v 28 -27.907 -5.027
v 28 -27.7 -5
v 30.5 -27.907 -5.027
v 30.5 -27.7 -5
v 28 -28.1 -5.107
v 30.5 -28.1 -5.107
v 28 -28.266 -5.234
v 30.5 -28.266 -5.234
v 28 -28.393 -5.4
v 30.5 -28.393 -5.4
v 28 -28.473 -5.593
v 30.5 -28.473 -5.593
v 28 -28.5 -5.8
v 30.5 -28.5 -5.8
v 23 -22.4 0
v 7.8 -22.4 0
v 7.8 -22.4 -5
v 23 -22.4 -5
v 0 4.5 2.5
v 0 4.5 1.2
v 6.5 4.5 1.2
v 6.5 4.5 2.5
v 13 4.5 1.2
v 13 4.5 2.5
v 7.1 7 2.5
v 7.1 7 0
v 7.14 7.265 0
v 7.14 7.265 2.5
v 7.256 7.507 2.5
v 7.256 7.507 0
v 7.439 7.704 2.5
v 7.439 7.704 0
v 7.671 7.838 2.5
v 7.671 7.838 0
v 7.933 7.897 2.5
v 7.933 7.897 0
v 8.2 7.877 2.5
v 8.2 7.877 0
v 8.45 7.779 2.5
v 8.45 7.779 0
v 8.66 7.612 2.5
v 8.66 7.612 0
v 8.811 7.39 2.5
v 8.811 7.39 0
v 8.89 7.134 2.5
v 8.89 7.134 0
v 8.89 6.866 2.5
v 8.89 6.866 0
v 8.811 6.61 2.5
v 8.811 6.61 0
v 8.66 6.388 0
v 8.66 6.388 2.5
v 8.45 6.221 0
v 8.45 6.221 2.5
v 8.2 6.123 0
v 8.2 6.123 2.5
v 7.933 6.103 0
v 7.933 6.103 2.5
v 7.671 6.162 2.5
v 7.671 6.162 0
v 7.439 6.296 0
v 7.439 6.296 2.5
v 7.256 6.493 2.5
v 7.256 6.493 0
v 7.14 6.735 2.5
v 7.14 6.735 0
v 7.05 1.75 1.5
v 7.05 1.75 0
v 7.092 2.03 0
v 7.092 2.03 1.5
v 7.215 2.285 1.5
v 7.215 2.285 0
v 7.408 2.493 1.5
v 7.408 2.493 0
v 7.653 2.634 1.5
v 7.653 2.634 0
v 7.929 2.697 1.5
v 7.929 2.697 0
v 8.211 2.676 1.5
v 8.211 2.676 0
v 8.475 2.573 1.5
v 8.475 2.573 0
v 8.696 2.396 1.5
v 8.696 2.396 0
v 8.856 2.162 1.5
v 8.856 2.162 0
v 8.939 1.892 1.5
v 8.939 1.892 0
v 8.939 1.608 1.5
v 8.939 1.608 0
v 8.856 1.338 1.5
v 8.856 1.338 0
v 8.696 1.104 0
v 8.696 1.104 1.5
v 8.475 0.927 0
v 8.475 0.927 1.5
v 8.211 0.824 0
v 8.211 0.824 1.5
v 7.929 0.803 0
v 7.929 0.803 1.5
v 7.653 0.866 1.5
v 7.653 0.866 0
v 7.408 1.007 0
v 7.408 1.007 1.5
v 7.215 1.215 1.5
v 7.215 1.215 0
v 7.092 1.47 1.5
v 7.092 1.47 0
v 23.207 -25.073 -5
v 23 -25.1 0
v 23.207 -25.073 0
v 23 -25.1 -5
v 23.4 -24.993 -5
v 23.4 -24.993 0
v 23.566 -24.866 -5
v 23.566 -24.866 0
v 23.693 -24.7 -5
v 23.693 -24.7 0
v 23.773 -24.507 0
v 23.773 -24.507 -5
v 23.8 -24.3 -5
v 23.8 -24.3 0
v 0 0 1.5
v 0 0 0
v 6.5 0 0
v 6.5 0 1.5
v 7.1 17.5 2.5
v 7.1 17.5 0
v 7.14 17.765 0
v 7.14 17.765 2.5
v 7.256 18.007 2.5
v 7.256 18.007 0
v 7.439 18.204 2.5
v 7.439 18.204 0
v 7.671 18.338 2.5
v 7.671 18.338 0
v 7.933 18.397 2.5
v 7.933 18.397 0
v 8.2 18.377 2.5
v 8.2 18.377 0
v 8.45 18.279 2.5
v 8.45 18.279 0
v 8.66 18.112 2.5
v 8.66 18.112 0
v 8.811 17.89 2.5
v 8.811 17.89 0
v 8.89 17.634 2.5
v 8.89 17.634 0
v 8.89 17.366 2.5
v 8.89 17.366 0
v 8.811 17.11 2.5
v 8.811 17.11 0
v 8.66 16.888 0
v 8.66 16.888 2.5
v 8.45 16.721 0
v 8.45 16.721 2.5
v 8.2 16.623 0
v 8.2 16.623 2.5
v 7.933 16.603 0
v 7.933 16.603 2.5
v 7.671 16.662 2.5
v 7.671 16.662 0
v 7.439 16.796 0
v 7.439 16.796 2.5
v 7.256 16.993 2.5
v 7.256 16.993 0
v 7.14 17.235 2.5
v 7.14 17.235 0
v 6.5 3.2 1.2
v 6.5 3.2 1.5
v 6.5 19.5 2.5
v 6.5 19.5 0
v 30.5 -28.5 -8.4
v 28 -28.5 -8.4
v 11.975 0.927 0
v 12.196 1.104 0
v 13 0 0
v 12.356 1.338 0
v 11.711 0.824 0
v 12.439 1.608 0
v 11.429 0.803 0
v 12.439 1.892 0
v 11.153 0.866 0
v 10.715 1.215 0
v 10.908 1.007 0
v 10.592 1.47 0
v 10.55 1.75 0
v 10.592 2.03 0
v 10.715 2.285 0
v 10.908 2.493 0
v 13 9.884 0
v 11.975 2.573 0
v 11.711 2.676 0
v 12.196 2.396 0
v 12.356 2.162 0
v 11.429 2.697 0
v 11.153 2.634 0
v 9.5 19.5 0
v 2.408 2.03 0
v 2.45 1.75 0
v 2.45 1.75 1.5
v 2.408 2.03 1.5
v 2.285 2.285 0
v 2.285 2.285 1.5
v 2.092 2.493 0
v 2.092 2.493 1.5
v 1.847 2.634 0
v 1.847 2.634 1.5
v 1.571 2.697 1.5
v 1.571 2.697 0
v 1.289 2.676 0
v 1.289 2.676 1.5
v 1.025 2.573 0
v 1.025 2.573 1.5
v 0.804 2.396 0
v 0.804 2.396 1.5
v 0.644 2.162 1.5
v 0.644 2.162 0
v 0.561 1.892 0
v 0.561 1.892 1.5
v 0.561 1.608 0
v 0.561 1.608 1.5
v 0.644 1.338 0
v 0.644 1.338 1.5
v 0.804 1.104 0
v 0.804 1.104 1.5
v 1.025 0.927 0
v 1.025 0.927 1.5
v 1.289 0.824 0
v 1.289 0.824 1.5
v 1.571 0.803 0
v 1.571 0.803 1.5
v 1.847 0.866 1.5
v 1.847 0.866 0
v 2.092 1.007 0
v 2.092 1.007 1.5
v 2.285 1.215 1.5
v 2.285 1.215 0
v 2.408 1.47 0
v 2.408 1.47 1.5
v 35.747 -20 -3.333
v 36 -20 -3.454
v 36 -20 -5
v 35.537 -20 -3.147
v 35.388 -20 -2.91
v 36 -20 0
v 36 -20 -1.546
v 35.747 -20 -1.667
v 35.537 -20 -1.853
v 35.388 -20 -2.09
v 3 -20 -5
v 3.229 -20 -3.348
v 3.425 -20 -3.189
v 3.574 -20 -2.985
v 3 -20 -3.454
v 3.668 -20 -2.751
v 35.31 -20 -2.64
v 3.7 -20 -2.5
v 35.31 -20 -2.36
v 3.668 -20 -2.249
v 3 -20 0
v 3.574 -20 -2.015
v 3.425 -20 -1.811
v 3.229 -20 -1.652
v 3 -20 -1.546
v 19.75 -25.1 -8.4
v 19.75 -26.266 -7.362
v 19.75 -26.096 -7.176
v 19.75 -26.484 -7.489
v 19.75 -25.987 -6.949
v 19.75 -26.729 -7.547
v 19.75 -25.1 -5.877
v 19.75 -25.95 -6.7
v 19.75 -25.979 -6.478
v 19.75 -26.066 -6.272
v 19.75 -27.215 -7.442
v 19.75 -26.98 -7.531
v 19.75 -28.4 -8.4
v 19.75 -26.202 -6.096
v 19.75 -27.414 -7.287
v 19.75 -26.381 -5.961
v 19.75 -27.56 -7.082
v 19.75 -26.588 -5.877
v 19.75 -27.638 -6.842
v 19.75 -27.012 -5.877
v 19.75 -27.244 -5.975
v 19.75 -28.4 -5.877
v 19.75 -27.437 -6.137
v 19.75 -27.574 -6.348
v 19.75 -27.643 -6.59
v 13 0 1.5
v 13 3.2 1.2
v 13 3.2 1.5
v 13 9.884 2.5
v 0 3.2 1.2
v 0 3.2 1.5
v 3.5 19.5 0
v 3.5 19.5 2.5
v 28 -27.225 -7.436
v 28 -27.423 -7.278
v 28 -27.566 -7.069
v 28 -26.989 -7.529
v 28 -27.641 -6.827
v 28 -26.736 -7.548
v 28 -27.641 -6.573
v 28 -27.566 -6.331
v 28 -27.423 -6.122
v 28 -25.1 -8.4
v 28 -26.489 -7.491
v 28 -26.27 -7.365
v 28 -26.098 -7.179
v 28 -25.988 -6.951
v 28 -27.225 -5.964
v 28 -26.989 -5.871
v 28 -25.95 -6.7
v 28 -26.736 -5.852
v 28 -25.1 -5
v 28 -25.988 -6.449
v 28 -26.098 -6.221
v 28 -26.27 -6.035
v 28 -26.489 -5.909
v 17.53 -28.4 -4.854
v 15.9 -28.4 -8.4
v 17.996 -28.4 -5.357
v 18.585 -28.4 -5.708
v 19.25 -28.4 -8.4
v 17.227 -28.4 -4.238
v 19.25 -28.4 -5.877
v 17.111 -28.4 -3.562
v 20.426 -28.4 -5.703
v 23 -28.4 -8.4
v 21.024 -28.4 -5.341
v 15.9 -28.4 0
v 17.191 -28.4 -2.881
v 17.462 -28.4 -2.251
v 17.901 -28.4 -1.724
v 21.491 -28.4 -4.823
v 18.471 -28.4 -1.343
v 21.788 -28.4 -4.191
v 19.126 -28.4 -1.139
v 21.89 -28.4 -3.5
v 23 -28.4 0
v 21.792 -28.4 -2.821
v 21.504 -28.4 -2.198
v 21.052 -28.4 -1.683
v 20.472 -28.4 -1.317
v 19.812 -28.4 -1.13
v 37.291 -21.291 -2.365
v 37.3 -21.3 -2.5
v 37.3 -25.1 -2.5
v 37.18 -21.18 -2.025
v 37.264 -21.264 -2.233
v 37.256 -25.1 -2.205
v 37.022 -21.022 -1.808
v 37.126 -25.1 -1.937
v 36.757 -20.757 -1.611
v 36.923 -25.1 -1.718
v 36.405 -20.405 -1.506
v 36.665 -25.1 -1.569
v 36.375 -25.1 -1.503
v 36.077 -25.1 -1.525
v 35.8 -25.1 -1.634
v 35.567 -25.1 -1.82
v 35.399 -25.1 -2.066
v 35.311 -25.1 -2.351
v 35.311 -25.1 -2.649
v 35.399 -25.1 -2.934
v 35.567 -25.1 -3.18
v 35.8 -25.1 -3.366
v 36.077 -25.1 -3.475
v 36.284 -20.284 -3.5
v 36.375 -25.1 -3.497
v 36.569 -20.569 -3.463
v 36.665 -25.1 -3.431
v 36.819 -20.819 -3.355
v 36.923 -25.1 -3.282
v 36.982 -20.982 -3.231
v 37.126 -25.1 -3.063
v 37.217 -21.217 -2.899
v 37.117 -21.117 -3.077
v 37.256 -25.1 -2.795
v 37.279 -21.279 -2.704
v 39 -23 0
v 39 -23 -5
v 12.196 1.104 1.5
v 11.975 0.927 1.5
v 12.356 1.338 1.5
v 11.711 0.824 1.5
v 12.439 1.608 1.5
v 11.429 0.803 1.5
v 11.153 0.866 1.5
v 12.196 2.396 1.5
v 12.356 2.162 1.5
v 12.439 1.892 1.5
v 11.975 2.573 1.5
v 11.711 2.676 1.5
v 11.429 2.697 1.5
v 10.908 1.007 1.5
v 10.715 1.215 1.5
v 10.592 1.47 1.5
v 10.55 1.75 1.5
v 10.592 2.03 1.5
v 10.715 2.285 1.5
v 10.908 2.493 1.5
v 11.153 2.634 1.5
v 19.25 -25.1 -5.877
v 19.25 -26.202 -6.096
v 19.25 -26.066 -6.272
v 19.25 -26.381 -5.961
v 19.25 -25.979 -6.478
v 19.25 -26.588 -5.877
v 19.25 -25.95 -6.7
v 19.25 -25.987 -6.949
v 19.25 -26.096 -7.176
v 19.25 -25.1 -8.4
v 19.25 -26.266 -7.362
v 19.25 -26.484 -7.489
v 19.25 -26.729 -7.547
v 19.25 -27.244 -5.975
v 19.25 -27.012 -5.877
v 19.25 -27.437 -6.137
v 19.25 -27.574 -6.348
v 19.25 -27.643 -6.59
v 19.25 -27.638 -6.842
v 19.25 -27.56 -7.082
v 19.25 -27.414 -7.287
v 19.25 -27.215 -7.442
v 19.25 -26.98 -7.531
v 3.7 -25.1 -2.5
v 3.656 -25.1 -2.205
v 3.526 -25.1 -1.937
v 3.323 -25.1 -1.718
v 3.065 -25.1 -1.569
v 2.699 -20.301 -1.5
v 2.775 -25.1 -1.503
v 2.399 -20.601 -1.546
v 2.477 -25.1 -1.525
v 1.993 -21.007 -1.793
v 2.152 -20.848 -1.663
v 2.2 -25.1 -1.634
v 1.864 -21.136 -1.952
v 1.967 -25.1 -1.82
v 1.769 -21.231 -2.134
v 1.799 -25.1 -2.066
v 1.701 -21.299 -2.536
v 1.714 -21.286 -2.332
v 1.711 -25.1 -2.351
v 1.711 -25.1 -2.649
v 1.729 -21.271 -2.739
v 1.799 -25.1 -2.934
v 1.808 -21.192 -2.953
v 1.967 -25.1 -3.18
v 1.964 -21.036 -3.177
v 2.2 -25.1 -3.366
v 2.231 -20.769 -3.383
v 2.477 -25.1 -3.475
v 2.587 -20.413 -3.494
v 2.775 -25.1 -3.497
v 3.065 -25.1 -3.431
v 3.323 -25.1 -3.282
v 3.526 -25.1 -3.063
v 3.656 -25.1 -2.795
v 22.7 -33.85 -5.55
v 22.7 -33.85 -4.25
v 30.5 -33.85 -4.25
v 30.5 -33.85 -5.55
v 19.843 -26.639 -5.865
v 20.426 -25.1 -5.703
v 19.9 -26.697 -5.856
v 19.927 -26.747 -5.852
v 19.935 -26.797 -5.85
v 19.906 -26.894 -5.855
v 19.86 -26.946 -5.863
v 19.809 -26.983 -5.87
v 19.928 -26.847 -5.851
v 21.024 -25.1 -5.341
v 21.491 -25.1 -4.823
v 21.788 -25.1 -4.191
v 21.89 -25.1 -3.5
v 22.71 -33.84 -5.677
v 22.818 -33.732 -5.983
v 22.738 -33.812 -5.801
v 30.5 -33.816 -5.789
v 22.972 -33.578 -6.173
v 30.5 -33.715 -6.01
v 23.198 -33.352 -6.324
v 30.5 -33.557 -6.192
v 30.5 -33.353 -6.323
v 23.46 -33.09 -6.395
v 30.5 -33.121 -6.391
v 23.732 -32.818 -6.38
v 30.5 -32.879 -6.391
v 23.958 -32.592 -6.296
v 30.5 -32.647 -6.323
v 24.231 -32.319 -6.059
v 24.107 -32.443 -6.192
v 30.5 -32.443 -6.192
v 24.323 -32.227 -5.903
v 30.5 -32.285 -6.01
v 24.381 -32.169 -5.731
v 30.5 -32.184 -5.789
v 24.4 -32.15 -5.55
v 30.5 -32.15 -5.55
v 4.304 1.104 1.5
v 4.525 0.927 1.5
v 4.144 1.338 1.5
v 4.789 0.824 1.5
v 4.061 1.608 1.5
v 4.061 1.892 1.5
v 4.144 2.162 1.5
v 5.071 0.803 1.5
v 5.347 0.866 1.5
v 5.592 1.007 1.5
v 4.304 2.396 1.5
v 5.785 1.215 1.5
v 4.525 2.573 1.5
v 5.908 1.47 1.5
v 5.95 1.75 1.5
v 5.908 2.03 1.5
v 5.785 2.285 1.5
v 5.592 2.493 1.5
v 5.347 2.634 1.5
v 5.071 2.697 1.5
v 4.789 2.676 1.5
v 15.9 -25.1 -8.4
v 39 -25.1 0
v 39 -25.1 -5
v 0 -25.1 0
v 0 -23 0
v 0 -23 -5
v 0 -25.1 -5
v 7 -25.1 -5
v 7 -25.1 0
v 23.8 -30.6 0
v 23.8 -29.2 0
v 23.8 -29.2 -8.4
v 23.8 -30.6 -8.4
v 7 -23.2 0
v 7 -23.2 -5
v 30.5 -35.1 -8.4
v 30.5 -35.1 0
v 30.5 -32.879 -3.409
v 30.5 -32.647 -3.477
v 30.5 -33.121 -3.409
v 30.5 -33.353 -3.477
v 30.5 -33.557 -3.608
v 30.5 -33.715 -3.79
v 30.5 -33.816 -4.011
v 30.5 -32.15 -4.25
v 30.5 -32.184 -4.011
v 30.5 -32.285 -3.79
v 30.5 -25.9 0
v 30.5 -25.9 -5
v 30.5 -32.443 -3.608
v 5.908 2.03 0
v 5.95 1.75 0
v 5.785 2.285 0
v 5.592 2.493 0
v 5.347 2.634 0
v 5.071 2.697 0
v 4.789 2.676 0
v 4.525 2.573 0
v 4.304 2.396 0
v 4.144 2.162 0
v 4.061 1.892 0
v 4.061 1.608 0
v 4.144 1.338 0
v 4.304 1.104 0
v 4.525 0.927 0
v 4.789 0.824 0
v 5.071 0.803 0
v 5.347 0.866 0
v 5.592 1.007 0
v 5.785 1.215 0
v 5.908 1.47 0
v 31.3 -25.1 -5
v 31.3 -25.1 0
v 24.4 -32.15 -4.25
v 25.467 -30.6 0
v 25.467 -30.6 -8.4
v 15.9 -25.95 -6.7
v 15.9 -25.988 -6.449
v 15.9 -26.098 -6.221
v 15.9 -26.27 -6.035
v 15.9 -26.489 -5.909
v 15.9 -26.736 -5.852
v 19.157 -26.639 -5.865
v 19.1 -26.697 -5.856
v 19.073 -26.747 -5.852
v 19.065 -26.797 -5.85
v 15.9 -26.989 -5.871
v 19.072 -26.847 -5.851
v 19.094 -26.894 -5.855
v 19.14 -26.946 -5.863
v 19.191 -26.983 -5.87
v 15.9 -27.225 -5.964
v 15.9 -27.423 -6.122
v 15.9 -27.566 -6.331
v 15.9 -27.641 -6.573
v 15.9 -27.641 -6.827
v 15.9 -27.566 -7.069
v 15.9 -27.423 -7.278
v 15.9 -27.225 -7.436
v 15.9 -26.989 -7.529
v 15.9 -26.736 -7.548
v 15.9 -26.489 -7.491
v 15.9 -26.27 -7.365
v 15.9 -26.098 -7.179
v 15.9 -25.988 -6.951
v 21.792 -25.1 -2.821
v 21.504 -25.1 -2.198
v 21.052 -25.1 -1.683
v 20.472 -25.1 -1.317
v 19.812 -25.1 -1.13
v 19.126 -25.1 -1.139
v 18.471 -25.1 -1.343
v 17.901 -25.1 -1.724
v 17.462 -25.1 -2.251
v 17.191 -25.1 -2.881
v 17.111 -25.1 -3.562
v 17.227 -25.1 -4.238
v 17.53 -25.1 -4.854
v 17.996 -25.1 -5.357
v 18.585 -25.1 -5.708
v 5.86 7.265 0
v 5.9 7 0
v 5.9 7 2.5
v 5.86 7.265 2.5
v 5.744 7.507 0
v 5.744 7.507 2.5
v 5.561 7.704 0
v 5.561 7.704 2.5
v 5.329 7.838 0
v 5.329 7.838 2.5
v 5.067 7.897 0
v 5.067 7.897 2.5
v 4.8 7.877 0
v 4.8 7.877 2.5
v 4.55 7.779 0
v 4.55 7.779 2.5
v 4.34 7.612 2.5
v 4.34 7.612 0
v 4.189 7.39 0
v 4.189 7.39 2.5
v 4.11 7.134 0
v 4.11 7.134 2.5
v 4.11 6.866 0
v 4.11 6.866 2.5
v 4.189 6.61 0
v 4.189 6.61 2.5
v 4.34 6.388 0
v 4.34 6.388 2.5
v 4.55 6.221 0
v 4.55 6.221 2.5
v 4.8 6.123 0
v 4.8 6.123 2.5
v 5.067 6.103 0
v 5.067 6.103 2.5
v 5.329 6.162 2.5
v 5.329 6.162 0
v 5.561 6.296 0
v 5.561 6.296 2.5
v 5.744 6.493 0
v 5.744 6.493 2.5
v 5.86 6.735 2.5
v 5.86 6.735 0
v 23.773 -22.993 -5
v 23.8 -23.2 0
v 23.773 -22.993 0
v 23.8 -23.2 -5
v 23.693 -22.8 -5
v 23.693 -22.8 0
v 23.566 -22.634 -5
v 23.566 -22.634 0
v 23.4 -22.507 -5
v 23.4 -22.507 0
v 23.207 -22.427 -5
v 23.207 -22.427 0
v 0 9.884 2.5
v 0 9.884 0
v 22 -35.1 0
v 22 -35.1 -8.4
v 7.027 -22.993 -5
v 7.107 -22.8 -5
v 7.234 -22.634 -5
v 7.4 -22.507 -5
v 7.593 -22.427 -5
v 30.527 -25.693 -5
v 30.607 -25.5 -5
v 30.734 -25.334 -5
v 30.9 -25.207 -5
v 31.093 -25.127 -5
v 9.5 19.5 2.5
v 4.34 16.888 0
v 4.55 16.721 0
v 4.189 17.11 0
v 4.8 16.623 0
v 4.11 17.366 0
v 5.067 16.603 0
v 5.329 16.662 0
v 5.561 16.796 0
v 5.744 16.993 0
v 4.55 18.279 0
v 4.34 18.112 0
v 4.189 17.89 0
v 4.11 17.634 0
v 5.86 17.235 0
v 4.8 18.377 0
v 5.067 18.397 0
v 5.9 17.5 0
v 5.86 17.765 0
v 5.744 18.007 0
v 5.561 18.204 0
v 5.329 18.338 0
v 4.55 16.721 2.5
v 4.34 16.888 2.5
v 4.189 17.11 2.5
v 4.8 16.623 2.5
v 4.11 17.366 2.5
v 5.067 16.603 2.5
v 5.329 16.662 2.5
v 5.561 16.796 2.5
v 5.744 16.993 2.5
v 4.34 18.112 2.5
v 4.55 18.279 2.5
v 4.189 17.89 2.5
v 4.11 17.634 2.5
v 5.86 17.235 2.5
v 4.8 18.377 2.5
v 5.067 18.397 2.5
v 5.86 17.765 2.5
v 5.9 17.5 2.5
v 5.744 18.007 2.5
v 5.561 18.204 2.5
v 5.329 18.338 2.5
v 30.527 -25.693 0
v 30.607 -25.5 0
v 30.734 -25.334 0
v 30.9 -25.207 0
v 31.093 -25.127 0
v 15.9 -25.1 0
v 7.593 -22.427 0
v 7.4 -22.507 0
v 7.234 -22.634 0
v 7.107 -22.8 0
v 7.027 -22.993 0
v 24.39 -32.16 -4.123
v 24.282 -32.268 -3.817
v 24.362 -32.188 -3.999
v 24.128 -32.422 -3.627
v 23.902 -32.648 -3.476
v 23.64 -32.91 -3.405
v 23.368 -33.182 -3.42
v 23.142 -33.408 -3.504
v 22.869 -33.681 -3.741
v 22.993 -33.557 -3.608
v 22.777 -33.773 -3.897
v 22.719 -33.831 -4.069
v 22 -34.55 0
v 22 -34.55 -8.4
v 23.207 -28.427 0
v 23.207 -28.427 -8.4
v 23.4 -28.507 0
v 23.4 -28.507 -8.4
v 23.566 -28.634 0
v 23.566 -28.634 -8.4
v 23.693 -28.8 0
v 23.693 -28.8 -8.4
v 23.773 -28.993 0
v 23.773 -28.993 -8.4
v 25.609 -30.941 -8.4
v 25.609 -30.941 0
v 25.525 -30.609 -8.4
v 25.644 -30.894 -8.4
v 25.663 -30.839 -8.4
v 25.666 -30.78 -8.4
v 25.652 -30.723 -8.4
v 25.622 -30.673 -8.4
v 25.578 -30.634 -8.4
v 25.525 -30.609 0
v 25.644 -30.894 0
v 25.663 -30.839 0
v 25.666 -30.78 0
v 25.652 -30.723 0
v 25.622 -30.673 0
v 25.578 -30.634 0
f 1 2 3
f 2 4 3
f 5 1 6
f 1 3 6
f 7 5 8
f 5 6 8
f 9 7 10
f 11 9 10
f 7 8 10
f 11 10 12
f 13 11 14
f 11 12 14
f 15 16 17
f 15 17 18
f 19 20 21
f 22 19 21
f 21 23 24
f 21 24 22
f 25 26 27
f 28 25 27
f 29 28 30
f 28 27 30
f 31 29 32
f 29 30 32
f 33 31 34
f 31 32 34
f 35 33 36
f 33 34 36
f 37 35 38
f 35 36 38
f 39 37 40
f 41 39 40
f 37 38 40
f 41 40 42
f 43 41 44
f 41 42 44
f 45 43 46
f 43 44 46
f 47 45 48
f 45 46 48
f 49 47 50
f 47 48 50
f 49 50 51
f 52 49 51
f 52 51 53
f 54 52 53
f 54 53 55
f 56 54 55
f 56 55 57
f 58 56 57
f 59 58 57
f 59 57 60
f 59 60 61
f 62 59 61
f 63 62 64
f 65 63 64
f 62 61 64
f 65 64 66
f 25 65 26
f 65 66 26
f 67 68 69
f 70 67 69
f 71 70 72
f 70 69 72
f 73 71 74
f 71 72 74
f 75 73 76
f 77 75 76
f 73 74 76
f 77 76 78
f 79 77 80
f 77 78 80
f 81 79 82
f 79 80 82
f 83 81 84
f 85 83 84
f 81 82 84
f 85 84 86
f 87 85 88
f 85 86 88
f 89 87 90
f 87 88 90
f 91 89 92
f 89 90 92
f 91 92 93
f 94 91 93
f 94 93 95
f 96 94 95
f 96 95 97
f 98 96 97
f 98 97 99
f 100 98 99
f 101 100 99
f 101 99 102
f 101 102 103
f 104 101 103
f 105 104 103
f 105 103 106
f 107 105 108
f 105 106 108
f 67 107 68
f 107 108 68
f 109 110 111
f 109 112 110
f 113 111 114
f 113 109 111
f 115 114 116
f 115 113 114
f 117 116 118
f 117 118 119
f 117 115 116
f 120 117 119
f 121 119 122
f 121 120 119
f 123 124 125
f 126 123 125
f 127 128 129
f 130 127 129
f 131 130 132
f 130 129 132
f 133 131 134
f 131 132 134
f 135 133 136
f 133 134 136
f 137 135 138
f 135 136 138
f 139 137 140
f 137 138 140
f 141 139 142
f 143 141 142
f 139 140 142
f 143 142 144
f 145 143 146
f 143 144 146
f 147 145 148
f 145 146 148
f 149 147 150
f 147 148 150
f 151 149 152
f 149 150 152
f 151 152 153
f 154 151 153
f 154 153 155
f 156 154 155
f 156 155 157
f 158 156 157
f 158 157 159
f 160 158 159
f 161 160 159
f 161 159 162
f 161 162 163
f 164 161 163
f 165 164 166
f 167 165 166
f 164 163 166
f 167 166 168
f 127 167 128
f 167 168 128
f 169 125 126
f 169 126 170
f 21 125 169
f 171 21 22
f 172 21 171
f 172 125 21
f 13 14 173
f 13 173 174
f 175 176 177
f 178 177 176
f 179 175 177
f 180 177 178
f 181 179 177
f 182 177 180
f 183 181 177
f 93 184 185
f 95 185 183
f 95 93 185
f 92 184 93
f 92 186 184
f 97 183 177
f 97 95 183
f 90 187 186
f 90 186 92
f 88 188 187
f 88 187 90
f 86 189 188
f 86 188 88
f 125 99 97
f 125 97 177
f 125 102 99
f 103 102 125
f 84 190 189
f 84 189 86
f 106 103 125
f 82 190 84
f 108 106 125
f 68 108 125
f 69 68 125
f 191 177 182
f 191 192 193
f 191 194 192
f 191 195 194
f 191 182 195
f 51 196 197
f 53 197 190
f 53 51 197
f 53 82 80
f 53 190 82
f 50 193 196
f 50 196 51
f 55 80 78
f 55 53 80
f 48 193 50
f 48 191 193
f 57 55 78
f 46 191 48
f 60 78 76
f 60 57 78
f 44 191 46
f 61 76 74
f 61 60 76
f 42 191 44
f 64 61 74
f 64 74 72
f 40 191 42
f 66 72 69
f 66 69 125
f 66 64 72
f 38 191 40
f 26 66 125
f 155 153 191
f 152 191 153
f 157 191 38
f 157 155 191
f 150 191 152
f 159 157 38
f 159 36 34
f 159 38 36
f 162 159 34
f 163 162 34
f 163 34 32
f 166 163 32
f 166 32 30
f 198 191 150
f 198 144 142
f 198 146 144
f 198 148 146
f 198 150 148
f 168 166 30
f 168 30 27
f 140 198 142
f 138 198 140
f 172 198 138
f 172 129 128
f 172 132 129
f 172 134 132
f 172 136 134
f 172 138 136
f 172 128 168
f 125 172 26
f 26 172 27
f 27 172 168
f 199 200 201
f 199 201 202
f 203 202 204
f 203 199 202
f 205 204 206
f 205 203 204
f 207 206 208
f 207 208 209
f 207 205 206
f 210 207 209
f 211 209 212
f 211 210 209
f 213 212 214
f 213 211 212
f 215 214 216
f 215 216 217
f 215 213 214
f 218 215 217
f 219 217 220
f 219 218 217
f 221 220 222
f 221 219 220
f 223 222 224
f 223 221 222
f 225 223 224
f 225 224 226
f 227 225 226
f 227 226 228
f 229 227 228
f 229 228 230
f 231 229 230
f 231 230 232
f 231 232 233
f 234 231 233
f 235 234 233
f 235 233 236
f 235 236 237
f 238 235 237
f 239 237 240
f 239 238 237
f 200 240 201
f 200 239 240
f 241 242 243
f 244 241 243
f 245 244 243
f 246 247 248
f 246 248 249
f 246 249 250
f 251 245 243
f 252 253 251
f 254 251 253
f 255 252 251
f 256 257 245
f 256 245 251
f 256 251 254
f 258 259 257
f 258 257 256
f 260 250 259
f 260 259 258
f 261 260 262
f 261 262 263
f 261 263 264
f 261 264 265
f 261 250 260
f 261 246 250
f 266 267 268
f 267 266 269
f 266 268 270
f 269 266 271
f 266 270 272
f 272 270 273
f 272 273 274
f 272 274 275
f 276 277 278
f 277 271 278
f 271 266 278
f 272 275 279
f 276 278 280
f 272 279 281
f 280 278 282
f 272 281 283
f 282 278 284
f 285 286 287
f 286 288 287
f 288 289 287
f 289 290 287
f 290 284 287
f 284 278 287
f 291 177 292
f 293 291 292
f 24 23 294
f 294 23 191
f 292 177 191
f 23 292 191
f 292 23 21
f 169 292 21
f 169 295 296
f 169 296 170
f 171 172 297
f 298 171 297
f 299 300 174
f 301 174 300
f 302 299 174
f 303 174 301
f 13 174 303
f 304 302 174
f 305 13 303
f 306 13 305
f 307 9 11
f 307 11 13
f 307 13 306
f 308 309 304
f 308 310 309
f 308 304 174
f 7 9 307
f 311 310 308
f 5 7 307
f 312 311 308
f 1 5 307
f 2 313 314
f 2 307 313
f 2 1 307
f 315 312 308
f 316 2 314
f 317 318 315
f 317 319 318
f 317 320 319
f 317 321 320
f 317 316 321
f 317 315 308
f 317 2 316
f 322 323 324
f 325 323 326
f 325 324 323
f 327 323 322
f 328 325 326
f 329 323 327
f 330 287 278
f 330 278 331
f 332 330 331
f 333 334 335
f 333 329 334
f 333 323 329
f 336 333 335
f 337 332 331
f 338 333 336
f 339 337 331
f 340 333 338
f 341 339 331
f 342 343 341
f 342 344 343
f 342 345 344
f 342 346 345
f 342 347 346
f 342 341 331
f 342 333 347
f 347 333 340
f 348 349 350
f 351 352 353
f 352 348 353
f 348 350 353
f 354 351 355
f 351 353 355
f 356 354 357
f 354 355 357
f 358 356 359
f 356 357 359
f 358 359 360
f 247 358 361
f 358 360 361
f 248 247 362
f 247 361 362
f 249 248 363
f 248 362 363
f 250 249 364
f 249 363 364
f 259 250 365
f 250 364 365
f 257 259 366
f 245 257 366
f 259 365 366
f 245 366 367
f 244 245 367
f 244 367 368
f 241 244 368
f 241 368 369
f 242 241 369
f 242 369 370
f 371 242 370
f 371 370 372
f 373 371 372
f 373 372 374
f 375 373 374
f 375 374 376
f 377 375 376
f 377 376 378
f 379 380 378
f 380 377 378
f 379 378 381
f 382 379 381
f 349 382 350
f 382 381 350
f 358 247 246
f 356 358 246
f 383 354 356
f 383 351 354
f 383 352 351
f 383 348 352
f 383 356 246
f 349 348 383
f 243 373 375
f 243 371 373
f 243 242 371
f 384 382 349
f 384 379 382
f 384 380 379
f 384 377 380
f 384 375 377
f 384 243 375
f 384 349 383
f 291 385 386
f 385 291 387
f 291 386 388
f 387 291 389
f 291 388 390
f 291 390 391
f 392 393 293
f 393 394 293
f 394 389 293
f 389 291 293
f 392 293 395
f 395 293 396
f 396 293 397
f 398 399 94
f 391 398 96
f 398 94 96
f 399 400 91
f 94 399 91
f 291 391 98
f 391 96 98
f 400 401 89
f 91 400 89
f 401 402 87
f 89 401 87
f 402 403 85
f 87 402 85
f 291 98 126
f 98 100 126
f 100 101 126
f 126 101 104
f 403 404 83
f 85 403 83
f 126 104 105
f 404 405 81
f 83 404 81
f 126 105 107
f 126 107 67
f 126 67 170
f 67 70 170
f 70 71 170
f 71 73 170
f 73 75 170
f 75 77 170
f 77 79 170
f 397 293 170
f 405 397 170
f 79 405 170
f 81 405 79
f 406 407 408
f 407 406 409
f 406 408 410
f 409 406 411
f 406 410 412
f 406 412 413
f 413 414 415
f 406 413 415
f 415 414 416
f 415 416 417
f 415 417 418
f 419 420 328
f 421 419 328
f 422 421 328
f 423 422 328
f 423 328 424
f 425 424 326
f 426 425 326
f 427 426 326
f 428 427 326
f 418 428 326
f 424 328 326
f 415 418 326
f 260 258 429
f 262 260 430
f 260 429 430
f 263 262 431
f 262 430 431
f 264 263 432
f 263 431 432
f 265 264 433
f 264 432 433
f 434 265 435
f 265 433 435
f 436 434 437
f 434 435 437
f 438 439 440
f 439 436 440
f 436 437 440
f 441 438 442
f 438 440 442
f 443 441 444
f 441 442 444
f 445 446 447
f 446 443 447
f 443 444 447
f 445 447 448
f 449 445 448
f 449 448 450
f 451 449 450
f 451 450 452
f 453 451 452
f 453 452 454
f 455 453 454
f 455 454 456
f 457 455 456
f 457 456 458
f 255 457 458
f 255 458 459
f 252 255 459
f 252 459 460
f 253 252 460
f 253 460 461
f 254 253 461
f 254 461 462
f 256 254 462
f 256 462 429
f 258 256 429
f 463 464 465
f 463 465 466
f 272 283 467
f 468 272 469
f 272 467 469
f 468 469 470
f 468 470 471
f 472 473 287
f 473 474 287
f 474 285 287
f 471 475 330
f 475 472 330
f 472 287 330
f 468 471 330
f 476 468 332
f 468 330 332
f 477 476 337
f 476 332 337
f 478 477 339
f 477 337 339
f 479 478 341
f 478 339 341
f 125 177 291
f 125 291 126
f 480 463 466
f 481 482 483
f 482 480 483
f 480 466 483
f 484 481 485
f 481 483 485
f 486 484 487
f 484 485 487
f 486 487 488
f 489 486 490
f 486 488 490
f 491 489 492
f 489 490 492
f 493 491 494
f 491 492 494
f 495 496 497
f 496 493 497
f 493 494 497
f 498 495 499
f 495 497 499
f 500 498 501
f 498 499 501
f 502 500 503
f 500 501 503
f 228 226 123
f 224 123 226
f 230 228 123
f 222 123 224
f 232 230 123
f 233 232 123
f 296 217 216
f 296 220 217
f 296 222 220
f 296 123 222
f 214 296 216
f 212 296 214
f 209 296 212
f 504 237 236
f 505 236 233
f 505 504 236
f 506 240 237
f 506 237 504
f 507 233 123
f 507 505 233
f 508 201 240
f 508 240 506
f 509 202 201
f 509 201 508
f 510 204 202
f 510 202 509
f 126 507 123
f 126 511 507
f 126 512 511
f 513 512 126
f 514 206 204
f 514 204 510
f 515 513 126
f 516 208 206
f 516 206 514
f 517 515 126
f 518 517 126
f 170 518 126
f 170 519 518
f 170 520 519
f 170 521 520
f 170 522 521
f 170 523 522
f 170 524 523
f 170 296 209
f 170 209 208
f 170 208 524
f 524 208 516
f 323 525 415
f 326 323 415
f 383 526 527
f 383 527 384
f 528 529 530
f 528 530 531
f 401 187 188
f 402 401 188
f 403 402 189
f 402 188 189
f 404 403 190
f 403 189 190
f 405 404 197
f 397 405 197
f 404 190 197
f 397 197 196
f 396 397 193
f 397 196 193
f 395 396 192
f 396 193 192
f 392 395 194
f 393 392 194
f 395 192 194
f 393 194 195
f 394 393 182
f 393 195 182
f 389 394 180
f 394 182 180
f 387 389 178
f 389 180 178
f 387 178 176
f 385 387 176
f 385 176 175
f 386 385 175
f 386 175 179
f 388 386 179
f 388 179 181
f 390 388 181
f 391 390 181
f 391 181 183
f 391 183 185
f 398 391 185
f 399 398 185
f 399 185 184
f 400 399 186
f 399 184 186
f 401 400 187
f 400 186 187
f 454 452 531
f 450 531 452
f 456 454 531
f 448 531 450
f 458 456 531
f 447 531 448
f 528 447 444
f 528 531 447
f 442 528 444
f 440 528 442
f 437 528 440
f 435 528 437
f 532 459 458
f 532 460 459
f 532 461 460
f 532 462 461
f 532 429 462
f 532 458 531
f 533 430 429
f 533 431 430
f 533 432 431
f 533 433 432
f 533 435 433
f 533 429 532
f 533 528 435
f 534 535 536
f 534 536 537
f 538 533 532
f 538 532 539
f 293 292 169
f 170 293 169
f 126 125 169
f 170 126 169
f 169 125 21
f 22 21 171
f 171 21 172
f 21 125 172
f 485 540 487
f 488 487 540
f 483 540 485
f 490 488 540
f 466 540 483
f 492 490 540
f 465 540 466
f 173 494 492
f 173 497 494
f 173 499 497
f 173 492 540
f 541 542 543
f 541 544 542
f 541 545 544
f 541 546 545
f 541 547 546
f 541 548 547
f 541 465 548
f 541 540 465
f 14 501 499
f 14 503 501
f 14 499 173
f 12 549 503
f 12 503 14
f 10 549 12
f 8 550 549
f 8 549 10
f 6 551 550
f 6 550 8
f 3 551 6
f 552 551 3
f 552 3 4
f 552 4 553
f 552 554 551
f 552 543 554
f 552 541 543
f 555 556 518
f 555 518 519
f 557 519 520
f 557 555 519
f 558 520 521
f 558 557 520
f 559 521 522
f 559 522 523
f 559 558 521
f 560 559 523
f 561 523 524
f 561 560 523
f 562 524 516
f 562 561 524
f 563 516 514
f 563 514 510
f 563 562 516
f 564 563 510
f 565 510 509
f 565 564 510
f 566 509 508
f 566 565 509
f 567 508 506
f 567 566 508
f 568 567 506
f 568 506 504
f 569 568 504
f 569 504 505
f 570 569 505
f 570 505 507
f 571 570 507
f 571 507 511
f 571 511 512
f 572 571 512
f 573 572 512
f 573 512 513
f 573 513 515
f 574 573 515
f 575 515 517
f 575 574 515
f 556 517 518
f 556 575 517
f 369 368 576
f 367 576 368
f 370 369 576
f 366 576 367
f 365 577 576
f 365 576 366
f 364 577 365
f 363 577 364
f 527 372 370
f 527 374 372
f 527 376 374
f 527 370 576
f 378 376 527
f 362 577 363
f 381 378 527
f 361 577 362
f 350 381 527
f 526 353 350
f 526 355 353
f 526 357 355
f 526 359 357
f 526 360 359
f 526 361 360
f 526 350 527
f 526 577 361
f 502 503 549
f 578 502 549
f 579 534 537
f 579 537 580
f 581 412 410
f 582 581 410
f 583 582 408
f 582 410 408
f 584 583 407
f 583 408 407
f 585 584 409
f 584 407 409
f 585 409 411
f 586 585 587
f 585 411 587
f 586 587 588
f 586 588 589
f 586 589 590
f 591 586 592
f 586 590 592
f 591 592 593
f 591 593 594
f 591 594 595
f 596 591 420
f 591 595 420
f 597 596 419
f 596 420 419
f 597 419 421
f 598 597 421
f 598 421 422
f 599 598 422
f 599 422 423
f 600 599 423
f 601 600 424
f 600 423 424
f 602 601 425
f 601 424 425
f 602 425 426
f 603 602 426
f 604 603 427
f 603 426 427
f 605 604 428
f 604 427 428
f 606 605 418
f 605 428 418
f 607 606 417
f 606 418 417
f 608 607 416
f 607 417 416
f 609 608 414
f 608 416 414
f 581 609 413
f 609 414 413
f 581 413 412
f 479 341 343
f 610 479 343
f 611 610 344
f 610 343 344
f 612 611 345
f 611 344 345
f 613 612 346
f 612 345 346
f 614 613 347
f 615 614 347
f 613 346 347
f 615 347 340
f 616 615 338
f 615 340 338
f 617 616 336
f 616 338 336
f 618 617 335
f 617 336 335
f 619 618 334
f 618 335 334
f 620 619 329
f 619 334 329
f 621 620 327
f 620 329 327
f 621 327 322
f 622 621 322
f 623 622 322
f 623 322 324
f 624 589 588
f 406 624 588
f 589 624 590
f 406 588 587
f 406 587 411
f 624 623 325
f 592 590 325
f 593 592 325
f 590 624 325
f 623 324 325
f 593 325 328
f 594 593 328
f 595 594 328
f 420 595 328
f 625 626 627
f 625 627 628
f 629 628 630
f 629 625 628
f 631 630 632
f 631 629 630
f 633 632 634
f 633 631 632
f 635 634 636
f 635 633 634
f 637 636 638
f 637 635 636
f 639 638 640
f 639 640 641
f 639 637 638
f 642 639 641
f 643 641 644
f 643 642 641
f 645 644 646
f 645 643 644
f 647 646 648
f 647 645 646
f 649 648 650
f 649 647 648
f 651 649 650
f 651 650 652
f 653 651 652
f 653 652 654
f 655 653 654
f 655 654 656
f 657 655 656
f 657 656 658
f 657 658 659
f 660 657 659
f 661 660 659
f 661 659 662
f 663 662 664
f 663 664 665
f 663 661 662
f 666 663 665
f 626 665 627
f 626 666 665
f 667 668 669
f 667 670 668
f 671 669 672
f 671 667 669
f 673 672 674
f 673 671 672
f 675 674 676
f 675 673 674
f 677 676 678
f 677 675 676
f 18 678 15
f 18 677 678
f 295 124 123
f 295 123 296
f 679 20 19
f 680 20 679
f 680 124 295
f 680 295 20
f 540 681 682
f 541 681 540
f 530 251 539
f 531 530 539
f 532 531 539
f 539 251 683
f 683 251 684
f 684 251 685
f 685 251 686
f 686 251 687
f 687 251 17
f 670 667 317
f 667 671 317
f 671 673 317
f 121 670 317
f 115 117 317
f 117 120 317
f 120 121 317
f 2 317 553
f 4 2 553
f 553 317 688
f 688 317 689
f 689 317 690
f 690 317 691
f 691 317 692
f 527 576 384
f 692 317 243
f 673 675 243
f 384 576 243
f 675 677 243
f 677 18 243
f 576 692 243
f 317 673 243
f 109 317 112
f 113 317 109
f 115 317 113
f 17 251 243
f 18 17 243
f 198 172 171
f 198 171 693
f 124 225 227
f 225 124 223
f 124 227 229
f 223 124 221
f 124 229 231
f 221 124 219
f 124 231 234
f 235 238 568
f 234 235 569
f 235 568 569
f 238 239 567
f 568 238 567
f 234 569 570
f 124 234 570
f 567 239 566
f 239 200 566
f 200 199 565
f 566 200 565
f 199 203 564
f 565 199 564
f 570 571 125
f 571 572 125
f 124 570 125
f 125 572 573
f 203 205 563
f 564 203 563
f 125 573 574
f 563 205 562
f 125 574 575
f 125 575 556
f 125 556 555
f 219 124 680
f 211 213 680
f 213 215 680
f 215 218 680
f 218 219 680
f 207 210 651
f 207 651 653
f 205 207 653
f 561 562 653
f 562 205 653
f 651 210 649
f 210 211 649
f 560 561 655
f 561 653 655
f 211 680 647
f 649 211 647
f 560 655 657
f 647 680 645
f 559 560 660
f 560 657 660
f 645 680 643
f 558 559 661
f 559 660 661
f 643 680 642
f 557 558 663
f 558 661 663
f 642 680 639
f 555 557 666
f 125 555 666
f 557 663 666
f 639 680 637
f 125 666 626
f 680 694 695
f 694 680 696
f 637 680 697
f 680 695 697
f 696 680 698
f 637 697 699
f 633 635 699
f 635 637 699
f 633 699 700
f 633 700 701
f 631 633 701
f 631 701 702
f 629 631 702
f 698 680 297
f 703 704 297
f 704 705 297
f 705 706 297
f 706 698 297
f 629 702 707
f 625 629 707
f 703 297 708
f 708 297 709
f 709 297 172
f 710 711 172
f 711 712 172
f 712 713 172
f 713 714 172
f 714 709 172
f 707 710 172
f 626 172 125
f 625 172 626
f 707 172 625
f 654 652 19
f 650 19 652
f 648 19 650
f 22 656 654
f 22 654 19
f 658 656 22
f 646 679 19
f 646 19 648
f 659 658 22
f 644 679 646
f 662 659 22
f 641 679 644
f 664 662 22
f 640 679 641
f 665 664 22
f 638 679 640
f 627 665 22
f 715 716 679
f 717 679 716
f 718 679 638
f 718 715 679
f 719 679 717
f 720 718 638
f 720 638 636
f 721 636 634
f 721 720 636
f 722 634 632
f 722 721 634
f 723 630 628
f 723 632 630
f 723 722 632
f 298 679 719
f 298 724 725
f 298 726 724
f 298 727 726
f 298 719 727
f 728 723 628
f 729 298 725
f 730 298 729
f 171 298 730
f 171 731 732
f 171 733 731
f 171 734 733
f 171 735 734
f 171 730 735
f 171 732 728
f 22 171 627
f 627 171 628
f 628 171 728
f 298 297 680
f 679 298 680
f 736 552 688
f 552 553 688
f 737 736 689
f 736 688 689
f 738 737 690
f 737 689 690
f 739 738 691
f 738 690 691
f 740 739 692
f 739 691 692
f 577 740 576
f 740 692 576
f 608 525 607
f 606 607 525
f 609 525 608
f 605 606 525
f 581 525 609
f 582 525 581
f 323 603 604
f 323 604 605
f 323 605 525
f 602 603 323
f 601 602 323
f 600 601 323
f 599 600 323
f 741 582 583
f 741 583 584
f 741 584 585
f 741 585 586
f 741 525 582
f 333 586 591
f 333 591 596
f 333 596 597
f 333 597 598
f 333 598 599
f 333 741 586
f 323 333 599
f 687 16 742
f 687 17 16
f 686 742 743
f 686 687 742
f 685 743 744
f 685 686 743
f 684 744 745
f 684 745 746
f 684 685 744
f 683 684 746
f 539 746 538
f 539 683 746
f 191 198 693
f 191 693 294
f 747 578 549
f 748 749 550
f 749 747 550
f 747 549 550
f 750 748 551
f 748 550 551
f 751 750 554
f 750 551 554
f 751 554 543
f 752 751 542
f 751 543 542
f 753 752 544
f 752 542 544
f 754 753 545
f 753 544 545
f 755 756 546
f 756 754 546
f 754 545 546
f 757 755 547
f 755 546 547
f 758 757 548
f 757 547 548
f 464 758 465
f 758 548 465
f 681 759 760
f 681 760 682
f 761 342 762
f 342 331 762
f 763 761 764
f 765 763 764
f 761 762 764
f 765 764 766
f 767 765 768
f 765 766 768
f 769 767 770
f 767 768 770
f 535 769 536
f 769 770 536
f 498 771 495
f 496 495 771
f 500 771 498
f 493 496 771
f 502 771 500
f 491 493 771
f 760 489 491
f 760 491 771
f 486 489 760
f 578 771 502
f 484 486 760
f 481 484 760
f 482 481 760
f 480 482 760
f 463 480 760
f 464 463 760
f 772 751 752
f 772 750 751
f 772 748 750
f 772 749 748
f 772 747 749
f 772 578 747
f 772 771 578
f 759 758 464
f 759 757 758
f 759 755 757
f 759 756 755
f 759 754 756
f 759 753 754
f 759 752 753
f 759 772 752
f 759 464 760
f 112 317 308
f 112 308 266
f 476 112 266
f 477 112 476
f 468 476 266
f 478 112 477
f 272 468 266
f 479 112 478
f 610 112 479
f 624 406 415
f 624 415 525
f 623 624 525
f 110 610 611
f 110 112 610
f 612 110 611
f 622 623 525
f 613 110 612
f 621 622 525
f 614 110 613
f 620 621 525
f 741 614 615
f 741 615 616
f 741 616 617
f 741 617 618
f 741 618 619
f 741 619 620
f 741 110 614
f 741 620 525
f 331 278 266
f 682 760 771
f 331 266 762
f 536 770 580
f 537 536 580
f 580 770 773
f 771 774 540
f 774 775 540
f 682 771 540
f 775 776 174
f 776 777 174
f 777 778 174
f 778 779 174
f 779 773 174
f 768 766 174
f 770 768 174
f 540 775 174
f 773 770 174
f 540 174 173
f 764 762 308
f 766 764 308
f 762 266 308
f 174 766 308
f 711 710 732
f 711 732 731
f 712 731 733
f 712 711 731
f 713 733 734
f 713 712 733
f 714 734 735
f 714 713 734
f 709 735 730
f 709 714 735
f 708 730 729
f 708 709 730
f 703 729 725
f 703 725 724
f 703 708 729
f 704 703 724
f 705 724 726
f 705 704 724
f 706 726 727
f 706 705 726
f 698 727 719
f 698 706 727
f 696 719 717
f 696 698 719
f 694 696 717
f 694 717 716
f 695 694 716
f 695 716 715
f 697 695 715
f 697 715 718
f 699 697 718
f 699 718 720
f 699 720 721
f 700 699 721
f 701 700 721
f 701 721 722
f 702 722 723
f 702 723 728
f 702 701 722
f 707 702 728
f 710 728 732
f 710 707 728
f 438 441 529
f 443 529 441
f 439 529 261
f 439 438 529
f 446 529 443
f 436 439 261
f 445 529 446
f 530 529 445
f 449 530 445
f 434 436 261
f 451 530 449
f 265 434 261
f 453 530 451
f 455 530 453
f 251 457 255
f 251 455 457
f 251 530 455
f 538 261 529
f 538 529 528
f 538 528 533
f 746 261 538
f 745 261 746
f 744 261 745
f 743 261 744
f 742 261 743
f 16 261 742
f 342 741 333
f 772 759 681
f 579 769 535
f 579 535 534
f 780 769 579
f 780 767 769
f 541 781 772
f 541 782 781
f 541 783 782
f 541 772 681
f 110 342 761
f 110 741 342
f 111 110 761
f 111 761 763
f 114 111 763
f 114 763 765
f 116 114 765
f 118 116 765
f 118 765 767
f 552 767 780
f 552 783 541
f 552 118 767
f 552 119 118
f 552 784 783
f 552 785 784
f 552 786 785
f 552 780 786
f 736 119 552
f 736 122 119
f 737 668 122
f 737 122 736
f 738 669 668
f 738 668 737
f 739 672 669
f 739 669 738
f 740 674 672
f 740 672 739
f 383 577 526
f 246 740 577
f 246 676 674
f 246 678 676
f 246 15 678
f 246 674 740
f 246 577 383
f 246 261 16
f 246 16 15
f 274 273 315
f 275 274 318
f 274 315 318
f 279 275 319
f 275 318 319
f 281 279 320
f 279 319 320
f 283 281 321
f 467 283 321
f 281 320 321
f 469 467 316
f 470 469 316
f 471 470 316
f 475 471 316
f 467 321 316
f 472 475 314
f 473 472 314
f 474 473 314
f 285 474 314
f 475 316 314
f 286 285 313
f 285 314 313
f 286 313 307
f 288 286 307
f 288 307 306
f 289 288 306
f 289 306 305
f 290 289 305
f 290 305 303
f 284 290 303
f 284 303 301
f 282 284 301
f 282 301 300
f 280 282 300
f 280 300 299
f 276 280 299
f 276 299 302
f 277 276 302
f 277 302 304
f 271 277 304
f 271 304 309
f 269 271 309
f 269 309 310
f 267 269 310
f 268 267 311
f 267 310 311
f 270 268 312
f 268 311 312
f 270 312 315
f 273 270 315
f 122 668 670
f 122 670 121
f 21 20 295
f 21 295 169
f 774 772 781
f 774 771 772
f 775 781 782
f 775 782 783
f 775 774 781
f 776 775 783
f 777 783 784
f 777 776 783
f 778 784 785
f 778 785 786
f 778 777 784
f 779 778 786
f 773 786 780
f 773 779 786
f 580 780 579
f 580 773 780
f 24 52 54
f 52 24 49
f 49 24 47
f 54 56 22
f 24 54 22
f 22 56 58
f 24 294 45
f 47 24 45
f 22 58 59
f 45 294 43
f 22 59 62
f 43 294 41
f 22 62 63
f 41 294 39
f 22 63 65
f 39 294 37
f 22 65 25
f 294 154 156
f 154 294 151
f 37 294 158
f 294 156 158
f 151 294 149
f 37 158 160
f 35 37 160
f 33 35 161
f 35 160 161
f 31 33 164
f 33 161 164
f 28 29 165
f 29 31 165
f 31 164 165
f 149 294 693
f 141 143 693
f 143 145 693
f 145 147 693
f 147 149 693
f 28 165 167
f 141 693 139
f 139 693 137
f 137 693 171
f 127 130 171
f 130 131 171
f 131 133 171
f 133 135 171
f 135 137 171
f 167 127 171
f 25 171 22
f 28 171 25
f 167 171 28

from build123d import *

# Parameters (mm, degrees)
F0_R         = 0.9
F1_DEPTH     = 2.5
F0_W         = 6.5
F0_H         = 1.3
F2_DEPTH     = 1.2
F0_H_2       = 3.2
F0_R_2       = 0.95
F3_DEPTH     = 1.5
F5_DEPTH     = 5
F6_DEPTH     = 8.4
F8_D         = 2
F8_DEPTH     = 14.4
F8_TIP       = 0.600860619
F10_DEPTH    = 3.8
F11_R        = 0.85
F12_DEPTH    = 30.501
F13_R        = 0.8
F14_T1_DEPTH = 20.4300979278
F15_R        = 0.2


# Not quite as in the source:
# - a fillet or chamfer that OpenCascade refuses, or shapes differently, is made with other operations: its cross-section is extruded or revolved along the edge and cut away or added


with BuildPart() as f1:
    # F0 (on Top) → F1 (new body)
    with BuildSketch(Plane.XY):
        Polygon((0, 9.8838290319), (0, 4.5), (6.5, 4.5), (6.5, 19.5), (3.5, 19.5), align=None)
        with Locations((5, 7)):
            Circle(F0_R, mode=Mode.SUBTRACT)
        with Locations((5, 17.5)):
            Circle(F0_R, mode=Mode.SUBTRACT)
    extrude(amount=F1_DEPTH)

    # F0 (on Top) → F2 (join)
    with BuildSketch(Plane.XY):
        with Locations((3.25, 3.85)):
            Rectangle(F0_W, F0_H)
    extrude(amount=F2_DEPTH)

    # F0 (on Top) → F3 (join)
    with BuildSketch(Plane.XY):
        with Locations((3.25, 1.6)):
            Rectangle(F0_W, F0_H_2)
        with Locations((1.5, 1.75)):
            Circle(F0_R_2, mode=Mode.SUBTRACT)
        with Locations((5, 1.75)):
            Circle(F0_R_2, mode=Mode.SUBTRACT)
    extrude(amount=F3_DEPTH)


with BuildPart() as f4_1:
    # F4: instance of F1
    add(f1.part.mirror(Plane(origin=(6.5, 10.5719562244, 1.1721614227), x_dir=(0, 1, 0), z_dir=(1, 0, 0))))


with BuildPart() as f5:
    # F0 (on Top) → F5 (new body)
    with BuildSketch(Plane.XY):
        Polygon((0, -20), (0, -25.1), (7, -25.1), (7, -22.4), (23.8, -22.4), (23.8, -25.1), (28, -25.1), (28, -28.5), (30.5, -28.5), (30.5, -25.1), (39, -25.1), (39, -20), align=None)
    extrude(amount=-F5_DEPTH)

    # F0 (on Top) → F6 (join)
    with BuildSketch(Plane.XY):
        Polygon((28, -25.1), (23.8, -25.1), (15.9, -25.1), (15.9, -28.4), (23.8, -28.4), (23.8, -30.6), (25.9500320151, -30.6), (22, -34.5500320151), (22, -35.1), (30.5, -35.1), (30.5, -28.5), (28, -28.5), align=None)
    extrude(amount=-F6_DEPTH)

    # F8
    with Locations(Plane(origin=(0, -20, 0), x_dir=(-1, 0, 0), z_dir=(0, 1, 0))):
        with Locations((-2.7, -2.5), (-36.3, -2.5)):
            Hole(F8_D / 2, depth=F8_DEPTH)
            with Locations((0, 0, -(F8_DEPTH + F8_TIP / 2))):  # 118° drill point
                Cone(0, F8_D / 2, F8_TIP, mode=Mode.SUBTRACT)

    # F9 (on face) → F10 (cut)
    with BuildSketch(Plane.XZ.offset(28.4)):
        with BuildLine():
            ThreePointArc((19.75, -5.8768887227), (21.276175667, -5.0991560274), (21.89, -3.5))
            ThreePointArc((21.89, -3.5), (17.9008439726, -1.723824333), (19.25, -5.8768887227))
            Line((19.25, -5.8768887227), (19.75, -5.8768887227))
        make_face()
        with BuildLine():
            ThreePointArc((19.75, -5.8768887227), (19.5, -5.89), (19.25, -5.8768887227))
            Line((19.25, -5.8768887227), (19.25, -8.4))
            Line((19.25, -8.4), (19.75, -8.4))
            Line((19.75, -8.4), (19.75, -5.8768887227))
        make_face()
        with BuildLine():
            Line((19.75, -5.8768887227), (19.25, -5.8768887227))
            ThreePointArc((19.25, -5.8768887227), (19.5, -5.89), (19.75, -5.8768887227))
        make_face()
    extrude(amount=-F10_DEPTH, mode=Mode.SUBTRACT)

    # F11 (on face) → F12 (cut, through all)
    with BuildSketch(Plane.YZ.offset(30.5)):
        with Locations((-26.8, -6.7)):
            Circle(F11_R)
        with BuildLine():
            Line((-33.85, -4.25), (-32.15, -4.25))
            ThreePointArc((-32.15, -4.25), (-33, -3.4), (-33.85, -4.25))
        make_face()
        with BuildLine():
            ThreePointArc((-32.4522774425, -4.9), (-32.2292652292, -4.6084242083), (-32.15, -4.25))
            Line((-32.15, -4.25), (-33.85, -4.25))
            ThreePointArc((-33.85, -4.25), (-33.7707347708, -4.6084242083), (-33.5477225575, -4.9))
            ThreePointArc((-33.5477225575, -4.9), (-33, -4.7), (-32.4522774425, -4.9))
        make_face()
        with BuildLine():
            Line((-33.85, -4.25), (-33.85, -5.55))
            ThreePointArc((-33.85, -5.55), (-33.7707347708, -5.1915757917), (-33.5477225575, -4.9))
            ThreePointArc((-33.5477225575, -4.9), (-33.7707347708, -4.6084242083), (-33.85, -4.25))
        make_face()
        with BuildLine():
            Line((-33.85, -5.55), (-32.15, -5.55))
            ThreePointArc((-32.15, -5.55), (-32.2292652292, -5.1915757917), (-32.4522774425, -4.9))
            ThreePointArc((-32.4522774425, -4.9), (-33, -5.1), (-33.5477225575, -4.9))
            ThreePointArc((-33.5477225575, -4.9), (-33.7707347708, -5.1915757917), (-33.85, -5.55))
        make_face()
        with BuildLine():
            ThreePointArc((-33.5477225575, -4.9), (-33, -5.1), (-32.4522774425, -4.9))
            ThreePointArc((-32.4522774425, -4.9), (-33, -4.7), (-33.5477225575, -4.9))
        make_face()
        with BuildLine():
            ThreePointArc((-32.4522774425, -4.9), (-32.2292652292, -5.1915757917), (-32.15, -5.55))
            Line((-32.15, -5.55), (-32.15, -4.25))
            ThreePointArc((-32.15, -4.25), (-32.2292652292, -4.6084242083), (-32.4522774425, -4.9))
        make_face()
        with BuildLine():
            ThreePointArc((-33.85, -5.55), (-33, -6.4), (-32.15, -5.55))
            Line((-32.15, -5.55), (-33.85, -5.55))
        make_face()
    extrude(amount=-F12_DEPTH, mode=Mode.SUBTRACT)

    # F13
    f13_edges = [f5.edges().sort_by_distance(p)[0] for p in [
        (29.25, -28.5, -5),
        (7, -22.4, -2.5),
        (23.8, -22.4, -2.5),
        (23.8, -25.1, -2.5),
        (30.5, -25.1, -2.5),
        (23.8, -28.4, -4.2),
    ]]
    fillet(f13_edges, radius=F13_R)

    # F14: chamfer of 3 on 2 edges, made by hand

    # F14_s2 → F14_t1 (cut)
    with BuildSketch(Plane.XY.offset(-12.7150489639)):
        Polygon((0, -23), (3, -20), (0, -20), align=None)
        Polygon((36, -20), (39, -23), (39, -20), align=None)
    extrude(amount=F14_T1_DEPTH, mode=Mode.SUBTRACT)

    # F15
    f15_edges = [f5.edges().sort_by_distance(p)[0] for p in [
        (25.950032, -30.6, -4.2),
    ]]
    fillet(f15_edges, radius=F15_R)


solid = Compound([f1.part, f4_1.part, f5.part])
